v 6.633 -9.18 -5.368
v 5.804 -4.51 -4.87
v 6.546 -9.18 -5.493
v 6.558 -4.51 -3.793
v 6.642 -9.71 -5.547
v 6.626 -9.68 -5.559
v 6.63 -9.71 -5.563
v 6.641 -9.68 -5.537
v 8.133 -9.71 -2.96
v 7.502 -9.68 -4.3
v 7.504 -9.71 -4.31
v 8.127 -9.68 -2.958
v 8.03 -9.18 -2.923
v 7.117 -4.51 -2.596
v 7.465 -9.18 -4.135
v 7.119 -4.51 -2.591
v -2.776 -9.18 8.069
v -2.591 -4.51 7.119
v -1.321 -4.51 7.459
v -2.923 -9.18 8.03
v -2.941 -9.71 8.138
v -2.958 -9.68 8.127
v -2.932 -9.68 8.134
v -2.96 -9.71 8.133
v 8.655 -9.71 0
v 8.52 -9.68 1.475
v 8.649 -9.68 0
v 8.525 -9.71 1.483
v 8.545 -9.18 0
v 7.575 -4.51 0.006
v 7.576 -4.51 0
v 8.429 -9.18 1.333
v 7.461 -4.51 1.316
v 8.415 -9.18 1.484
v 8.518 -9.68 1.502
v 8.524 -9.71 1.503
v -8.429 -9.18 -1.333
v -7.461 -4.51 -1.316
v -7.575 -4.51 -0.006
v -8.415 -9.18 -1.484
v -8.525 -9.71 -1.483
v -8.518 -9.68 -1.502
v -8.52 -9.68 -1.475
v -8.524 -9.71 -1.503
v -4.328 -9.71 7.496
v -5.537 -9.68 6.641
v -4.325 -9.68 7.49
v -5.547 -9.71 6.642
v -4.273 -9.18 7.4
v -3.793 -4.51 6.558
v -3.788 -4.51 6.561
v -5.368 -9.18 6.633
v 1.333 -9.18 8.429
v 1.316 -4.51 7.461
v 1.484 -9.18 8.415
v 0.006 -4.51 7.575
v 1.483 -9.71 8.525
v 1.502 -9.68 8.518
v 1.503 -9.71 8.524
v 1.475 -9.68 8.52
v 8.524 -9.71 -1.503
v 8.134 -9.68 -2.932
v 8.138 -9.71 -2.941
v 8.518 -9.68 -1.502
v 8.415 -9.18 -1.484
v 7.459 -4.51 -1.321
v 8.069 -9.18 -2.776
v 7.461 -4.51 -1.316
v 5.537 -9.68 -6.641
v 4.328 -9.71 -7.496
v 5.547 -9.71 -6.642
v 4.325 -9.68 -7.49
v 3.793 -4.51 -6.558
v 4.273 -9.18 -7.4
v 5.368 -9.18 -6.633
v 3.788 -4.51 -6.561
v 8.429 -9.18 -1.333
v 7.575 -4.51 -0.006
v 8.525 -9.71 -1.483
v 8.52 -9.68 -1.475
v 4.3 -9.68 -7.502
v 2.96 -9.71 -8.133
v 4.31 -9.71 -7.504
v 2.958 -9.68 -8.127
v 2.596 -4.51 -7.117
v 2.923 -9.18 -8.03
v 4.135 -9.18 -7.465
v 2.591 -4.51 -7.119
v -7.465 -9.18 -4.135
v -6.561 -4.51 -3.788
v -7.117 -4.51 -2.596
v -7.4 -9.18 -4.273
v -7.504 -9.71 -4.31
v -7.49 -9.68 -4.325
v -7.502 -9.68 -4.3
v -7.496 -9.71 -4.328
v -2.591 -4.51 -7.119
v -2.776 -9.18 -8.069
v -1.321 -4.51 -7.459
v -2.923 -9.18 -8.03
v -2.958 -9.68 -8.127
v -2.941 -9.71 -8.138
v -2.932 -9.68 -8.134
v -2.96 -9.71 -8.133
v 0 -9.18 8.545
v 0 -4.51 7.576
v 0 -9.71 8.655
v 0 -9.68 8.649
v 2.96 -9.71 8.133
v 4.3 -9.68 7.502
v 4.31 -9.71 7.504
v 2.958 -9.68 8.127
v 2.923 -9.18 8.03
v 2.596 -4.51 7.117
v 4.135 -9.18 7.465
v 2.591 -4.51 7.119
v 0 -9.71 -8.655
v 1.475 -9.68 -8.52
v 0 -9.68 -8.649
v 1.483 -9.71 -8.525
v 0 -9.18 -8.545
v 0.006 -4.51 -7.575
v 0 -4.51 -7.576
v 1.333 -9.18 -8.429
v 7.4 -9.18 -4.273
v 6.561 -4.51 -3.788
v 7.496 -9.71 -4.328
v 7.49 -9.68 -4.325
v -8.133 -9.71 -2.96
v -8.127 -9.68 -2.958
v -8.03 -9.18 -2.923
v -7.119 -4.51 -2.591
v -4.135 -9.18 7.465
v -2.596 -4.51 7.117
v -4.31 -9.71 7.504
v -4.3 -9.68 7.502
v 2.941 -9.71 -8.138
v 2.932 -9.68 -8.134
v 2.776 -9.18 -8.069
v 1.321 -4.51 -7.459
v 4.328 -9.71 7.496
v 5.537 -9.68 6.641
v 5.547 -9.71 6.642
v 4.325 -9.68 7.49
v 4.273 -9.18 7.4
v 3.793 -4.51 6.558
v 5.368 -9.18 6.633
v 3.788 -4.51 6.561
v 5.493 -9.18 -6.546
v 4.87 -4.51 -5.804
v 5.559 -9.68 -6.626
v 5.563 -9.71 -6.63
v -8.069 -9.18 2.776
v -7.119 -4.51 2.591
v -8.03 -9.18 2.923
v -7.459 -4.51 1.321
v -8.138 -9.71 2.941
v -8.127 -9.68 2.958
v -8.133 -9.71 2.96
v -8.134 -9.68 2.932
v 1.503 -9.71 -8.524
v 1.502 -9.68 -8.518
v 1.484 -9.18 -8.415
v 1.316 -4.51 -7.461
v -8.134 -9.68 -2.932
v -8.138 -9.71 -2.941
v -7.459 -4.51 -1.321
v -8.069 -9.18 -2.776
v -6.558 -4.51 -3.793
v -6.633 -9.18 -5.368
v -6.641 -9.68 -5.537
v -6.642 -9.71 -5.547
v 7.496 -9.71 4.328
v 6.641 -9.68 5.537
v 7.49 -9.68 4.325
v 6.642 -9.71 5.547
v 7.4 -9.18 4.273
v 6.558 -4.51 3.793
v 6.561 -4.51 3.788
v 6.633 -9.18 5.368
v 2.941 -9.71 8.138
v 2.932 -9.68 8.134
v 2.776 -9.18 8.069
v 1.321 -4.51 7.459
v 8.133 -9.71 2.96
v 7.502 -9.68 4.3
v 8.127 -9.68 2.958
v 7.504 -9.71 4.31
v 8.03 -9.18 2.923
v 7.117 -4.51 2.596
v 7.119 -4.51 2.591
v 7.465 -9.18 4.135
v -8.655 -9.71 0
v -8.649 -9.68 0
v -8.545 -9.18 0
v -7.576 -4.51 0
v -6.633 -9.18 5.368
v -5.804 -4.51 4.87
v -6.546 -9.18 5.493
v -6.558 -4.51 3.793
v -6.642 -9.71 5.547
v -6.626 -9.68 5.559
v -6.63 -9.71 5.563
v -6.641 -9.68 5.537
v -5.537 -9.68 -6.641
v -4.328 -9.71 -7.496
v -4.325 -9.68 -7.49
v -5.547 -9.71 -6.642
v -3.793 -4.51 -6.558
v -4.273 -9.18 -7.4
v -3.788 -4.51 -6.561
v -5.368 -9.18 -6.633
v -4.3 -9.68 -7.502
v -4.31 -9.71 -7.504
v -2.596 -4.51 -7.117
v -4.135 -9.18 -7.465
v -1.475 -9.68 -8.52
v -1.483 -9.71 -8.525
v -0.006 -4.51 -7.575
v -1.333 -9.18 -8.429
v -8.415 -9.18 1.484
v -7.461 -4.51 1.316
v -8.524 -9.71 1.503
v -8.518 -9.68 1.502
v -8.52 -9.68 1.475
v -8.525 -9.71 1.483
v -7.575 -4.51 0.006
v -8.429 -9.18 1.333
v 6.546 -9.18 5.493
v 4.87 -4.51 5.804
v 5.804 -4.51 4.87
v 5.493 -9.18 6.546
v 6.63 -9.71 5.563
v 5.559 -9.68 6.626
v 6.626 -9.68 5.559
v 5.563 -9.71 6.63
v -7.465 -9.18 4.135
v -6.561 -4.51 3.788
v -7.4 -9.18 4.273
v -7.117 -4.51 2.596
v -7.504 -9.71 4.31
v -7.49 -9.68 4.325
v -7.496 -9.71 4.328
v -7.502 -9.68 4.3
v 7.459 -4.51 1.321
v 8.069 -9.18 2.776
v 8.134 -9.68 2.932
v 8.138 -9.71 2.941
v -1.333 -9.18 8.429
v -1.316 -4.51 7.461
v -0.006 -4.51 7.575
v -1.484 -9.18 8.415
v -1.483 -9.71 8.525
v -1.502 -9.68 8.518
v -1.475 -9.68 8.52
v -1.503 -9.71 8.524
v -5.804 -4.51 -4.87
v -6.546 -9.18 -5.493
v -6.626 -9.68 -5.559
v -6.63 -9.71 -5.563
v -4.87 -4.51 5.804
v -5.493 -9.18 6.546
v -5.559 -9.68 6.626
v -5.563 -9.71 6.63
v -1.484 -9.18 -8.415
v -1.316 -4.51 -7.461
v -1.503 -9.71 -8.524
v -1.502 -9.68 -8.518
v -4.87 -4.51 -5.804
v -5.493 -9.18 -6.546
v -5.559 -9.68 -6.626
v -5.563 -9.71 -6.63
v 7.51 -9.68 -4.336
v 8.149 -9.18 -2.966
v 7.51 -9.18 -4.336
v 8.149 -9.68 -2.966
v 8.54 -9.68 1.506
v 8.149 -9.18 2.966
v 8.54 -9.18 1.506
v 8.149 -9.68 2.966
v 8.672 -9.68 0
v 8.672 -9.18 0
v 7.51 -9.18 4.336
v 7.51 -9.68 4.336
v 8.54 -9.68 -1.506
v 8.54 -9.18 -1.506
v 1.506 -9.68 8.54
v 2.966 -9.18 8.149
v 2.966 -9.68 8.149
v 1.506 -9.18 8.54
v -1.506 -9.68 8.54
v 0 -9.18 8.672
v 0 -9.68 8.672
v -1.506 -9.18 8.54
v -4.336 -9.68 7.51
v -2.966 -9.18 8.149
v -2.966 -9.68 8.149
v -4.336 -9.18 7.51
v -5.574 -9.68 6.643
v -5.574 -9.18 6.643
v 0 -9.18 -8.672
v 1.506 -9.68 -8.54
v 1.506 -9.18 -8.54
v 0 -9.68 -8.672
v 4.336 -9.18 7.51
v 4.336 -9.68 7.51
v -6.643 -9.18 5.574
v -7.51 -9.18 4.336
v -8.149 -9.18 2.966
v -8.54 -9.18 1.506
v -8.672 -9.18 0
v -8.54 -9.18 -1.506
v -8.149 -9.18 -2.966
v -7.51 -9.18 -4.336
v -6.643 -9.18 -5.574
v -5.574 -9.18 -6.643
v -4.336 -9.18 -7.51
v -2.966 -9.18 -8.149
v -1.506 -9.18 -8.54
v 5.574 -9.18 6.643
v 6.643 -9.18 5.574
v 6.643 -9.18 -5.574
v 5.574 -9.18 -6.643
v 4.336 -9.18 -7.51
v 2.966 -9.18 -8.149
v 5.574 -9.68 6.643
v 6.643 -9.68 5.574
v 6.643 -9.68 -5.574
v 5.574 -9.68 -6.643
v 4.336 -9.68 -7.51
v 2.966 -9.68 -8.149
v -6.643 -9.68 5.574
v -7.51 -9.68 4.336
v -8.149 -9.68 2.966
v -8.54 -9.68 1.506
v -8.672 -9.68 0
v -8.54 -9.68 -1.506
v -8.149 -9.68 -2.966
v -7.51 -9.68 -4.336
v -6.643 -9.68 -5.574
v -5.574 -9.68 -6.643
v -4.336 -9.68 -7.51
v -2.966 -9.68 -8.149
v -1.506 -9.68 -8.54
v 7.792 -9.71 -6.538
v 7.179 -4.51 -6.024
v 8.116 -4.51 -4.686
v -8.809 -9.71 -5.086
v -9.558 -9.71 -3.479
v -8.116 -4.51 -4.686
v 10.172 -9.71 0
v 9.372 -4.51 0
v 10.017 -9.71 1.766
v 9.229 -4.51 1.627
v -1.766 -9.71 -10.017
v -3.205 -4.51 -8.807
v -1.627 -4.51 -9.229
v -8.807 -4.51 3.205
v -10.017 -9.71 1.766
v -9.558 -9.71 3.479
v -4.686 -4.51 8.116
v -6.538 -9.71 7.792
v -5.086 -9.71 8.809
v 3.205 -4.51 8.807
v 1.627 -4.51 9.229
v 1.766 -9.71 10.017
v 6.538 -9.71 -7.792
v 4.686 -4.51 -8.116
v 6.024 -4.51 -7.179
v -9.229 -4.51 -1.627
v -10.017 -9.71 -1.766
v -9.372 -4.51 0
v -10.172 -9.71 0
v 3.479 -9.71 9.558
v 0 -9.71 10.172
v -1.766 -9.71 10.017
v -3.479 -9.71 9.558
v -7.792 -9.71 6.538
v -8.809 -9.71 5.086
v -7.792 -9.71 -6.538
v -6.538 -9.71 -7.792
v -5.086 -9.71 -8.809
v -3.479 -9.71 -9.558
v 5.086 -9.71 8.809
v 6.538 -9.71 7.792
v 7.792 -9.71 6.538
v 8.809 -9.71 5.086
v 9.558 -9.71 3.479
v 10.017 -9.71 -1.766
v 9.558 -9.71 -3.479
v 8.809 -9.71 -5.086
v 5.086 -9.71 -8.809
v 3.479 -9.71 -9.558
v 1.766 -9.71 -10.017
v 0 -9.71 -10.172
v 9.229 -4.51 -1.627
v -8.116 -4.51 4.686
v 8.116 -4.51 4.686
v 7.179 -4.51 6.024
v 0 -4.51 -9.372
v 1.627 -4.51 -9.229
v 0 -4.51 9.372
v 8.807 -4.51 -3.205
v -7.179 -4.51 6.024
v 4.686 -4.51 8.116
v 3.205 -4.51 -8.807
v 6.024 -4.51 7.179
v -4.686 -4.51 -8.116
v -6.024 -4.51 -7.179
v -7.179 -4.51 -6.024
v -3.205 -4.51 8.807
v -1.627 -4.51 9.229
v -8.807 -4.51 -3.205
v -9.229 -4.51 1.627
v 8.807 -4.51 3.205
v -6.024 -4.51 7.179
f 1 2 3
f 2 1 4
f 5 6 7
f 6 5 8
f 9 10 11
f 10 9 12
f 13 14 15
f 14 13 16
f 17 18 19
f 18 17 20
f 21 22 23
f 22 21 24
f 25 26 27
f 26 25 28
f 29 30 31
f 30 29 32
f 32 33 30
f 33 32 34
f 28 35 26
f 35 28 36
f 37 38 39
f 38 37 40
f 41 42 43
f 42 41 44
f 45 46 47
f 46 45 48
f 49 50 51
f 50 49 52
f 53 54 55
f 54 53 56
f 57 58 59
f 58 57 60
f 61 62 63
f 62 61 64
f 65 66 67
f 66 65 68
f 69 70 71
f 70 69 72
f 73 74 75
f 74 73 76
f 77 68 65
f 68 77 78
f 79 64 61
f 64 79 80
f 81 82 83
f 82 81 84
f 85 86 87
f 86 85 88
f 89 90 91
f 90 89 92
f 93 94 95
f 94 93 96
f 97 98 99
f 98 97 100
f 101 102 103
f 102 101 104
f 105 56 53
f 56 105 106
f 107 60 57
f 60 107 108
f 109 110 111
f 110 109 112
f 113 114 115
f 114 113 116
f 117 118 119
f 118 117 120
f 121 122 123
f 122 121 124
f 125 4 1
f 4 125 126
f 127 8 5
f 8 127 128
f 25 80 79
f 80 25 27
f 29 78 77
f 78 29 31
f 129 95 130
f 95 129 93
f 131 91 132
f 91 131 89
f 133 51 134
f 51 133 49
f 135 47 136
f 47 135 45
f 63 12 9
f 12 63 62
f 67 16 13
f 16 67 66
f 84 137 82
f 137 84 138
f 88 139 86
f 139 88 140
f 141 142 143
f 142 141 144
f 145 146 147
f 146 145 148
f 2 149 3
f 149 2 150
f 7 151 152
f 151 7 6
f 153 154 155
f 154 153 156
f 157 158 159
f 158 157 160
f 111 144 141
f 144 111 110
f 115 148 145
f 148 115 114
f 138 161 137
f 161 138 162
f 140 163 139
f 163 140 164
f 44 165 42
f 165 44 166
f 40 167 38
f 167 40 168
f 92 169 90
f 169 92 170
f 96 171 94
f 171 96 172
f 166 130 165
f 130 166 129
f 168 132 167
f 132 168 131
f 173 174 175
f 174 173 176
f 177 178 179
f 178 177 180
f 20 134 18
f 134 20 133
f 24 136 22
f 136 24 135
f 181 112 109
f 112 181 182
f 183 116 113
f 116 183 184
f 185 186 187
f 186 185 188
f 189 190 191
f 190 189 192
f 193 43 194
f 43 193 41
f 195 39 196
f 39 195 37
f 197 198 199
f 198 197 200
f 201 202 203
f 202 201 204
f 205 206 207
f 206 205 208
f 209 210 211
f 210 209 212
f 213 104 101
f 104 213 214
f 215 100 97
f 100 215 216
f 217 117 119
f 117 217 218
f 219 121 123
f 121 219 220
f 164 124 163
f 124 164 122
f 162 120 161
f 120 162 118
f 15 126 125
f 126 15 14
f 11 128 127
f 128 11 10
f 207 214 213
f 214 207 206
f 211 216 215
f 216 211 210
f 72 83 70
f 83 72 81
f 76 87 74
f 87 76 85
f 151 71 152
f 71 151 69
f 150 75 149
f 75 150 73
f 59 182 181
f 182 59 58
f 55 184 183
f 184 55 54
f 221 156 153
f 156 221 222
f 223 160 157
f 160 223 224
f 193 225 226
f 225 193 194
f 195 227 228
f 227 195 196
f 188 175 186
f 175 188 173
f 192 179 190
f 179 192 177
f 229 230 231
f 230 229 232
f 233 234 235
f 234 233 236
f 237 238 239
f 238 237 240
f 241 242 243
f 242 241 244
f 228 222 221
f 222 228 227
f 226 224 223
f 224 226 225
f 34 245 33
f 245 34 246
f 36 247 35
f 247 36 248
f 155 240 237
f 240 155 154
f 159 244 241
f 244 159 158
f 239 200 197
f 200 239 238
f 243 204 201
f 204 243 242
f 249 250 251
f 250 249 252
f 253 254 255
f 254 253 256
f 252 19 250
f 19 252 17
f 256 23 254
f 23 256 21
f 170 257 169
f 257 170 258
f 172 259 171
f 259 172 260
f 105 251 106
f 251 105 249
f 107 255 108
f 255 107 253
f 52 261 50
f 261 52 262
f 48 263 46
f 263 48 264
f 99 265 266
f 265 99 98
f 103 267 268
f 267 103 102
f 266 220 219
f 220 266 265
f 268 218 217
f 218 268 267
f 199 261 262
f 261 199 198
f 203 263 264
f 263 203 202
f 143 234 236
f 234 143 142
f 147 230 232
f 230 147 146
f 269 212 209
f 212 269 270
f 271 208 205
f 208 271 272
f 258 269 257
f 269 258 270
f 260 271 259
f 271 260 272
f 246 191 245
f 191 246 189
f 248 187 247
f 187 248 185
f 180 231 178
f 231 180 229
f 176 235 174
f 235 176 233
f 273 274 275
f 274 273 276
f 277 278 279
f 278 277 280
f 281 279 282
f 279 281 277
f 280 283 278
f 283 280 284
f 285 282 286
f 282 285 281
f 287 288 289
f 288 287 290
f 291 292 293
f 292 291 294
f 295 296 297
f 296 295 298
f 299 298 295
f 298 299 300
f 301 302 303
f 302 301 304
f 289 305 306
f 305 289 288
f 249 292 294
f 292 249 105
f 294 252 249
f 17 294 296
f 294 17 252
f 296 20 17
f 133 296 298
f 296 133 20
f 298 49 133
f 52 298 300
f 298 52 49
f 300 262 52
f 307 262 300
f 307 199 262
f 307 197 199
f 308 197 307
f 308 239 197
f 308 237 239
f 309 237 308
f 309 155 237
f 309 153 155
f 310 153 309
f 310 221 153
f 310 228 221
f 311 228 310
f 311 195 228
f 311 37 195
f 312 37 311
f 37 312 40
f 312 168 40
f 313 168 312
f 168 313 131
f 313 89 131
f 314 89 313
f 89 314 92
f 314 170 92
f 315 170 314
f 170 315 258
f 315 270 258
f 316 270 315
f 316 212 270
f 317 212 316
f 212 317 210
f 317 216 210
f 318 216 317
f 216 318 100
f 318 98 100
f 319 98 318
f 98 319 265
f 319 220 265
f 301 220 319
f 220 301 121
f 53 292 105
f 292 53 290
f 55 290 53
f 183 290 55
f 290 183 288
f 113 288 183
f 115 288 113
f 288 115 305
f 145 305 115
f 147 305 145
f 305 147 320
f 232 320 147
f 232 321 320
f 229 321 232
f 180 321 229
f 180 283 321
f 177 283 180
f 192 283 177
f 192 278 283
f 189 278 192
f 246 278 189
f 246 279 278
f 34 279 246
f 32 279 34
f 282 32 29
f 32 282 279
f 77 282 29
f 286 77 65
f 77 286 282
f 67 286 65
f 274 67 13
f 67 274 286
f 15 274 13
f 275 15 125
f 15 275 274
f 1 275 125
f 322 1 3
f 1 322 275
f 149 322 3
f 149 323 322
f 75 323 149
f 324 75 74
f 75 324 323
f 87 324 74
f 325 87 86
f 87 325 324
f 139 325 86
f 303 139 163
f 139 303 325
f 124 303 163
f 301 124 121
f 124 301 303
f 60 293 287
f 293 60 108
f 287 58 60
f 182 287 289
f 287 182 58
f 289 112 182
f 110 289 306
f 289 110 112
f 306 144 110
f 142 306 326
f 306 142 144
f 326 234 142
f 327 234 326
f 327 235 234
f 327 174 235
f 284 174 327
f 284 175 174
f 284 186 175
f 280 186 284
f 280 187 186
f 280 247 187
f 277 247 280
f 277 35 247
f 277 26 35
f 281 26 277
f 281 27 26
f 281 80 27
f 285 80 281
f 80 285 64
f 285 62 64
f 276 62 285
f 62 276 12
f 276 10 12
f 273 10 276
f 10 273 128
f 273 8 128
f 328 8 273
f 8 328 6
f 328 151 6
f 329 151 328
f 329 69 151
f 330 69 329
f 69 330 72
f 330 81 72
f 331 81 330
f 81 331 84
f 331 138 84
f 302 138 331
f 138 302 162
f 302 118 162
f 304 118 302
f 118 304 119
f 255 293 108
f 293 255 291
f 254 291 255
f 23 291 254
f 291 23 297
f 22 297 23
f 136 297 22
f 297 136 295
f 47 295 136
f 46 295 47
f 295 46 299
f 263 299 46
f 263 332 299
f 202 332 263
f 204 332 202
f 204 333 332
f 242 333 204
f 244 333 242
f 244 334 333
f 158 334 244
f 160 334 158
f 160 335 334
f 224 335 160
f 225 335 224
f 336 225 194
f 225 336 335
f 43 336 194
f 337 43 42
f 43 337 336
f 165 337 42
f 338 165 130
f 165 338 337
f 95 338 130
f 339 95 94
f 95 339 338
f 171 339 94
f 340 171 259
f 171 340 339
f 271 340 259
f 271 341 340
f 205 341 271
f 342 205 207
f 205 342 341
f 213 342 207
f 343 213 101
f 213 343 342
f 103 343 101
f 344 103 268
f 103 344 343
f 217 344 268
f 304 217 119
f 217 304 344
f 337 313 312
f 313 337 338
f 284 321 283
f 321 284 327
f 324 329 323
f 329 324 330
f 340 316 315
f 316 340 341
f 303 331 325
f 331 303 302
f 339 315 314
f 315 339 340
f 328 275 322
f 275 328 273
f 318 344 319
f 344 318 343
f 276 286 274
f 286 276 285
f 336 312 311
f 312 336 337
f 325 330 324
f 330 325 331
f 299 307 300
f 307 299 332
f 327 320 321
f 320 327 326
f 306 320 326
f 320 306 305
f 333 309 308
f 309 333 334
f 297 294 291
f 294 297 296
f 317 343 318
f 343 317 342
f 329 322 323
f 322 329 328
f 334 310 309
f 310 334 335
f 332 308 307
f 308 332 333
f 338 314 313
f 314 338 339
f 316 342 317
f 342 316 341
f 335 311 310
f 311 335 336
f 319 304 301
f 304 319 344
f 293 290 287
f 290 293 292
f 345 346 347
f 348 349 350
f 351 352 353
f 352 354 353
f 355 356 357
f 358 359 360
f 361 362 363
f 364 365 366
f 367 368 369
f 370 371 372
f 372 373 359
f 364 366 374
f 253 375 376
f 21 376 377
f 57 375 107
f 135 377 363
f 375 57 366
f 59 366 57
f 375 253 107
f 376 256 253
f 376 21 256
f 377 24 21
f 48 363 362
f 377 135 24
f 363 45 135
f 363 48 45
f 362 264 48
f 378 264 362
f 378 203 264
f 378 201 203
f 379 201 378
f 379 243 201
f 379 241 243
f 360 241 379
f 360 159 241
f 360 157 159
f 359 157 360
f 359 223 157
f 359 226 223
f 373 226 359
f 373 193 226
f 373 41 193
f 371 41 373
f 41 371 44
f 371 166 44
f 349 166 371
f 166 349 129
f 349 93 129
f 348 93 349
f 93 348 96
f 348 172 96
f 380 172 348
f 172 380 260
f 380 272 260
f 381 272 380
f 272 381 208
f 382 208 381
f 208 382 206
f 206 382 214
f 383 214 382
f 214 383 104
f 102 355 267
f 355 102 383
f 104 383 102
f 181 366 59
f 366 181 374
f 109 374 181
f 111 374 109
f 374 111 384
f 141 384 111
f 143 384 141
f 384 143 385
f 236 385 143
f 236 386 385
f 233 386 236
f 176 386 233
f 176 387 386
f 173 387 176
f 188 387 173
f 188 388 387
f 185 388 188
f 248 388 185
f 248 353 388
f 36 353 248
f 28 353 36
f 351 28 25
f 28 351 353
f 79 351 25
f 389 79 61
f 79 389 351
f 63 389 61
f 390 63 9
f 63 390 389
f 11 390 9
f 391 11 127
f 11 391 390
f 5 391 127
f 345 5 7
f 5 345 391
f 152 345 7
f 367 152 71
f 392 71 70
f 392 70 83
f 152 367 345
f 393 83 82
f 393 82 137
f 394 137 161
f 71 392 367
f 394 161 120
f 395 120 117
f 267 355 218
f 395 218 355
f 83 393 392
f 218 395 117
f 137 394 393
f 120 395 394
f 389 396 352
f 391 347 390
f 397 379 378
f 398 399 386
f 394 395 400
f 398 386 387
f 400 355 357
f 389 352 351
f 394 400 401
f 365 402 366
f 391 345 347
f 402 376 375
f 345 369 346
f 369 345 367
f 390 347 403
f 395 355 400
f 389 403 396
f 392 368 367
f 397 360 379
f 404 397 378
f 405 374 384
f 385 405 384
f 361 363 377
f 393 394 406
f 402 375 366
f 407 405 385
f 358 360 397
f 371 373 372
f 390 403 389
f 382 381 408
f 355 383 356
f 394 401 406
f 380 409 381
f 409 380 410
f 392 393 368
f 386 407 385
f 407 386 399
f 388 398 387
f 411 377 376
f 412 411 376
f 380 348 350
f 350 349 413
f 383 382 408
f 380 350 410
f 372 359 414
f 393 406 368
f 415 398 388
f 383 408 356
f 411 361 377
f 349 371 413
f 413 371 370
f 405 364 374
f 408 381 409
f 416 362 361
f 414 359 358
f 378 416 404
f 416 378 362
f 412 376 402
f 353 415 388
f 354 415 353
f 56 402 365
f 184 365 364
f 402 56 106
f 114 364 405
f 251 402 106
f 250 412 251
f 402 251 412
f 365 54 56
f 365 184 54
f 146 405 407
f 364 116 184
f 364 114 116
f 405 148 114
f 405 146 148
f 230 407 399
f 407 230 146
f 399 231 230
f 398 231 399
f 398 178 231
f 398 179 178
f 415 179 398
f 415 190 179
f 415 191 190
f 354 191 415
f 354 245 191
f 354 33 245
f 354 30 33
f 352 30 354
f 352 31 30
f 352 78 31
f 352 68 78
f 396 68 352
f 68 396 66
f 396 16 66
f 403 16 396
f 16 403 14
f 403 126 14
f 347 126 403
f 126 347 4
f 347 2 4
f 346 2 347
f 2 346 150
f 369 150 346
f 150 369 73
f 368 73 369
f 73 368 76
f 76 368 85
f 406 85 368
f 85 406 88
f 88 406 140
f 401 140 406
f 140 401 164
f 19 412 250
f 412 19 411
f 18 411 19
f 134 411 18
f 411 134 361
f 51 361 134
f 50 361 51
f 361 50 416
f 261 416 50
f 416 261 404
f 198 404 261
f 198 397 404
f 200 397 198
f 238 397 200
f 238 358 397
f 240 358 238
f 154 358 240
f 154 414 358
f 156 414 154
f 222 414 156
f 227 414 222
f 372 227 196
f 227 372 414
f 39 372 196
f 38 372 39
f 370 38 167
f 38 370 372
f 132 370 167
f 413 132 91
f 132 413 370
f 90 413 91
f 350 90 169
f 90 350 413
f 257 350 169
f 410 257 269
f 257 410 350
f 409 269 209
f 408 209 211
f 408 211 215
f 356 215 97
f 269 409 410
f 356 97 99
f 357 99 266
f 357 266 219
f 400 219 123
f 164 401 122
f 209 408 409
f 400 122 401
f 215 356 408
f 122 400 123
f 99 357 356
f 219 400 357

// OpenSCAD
$fa = 10; 
$fs = 1.5;


color(c = "blue") {
	difference() {
		translate(v = [0, -4.5100000000, 0]) {
			rotate(a = [90, 0, 0]) {
				cylinder(h = 5.2000000000, r1 = 9.3718317562, r2 = 10.1718317562);
			}
		}
		translate(v = [0, -4.4900000000, 0]) {
			rotate(a = [90, 0, 0]) {
				union() {
					cylinder(h = 5.3000000000, r1 = 7.5718317562, r2 = 8.6718317562);
					translate(v = [0, 0, 4.6900000000]) {
						cylinder(h = 0.5000000000, r = 8.6718317562);
					}
				}
			}
		}
	}
}
